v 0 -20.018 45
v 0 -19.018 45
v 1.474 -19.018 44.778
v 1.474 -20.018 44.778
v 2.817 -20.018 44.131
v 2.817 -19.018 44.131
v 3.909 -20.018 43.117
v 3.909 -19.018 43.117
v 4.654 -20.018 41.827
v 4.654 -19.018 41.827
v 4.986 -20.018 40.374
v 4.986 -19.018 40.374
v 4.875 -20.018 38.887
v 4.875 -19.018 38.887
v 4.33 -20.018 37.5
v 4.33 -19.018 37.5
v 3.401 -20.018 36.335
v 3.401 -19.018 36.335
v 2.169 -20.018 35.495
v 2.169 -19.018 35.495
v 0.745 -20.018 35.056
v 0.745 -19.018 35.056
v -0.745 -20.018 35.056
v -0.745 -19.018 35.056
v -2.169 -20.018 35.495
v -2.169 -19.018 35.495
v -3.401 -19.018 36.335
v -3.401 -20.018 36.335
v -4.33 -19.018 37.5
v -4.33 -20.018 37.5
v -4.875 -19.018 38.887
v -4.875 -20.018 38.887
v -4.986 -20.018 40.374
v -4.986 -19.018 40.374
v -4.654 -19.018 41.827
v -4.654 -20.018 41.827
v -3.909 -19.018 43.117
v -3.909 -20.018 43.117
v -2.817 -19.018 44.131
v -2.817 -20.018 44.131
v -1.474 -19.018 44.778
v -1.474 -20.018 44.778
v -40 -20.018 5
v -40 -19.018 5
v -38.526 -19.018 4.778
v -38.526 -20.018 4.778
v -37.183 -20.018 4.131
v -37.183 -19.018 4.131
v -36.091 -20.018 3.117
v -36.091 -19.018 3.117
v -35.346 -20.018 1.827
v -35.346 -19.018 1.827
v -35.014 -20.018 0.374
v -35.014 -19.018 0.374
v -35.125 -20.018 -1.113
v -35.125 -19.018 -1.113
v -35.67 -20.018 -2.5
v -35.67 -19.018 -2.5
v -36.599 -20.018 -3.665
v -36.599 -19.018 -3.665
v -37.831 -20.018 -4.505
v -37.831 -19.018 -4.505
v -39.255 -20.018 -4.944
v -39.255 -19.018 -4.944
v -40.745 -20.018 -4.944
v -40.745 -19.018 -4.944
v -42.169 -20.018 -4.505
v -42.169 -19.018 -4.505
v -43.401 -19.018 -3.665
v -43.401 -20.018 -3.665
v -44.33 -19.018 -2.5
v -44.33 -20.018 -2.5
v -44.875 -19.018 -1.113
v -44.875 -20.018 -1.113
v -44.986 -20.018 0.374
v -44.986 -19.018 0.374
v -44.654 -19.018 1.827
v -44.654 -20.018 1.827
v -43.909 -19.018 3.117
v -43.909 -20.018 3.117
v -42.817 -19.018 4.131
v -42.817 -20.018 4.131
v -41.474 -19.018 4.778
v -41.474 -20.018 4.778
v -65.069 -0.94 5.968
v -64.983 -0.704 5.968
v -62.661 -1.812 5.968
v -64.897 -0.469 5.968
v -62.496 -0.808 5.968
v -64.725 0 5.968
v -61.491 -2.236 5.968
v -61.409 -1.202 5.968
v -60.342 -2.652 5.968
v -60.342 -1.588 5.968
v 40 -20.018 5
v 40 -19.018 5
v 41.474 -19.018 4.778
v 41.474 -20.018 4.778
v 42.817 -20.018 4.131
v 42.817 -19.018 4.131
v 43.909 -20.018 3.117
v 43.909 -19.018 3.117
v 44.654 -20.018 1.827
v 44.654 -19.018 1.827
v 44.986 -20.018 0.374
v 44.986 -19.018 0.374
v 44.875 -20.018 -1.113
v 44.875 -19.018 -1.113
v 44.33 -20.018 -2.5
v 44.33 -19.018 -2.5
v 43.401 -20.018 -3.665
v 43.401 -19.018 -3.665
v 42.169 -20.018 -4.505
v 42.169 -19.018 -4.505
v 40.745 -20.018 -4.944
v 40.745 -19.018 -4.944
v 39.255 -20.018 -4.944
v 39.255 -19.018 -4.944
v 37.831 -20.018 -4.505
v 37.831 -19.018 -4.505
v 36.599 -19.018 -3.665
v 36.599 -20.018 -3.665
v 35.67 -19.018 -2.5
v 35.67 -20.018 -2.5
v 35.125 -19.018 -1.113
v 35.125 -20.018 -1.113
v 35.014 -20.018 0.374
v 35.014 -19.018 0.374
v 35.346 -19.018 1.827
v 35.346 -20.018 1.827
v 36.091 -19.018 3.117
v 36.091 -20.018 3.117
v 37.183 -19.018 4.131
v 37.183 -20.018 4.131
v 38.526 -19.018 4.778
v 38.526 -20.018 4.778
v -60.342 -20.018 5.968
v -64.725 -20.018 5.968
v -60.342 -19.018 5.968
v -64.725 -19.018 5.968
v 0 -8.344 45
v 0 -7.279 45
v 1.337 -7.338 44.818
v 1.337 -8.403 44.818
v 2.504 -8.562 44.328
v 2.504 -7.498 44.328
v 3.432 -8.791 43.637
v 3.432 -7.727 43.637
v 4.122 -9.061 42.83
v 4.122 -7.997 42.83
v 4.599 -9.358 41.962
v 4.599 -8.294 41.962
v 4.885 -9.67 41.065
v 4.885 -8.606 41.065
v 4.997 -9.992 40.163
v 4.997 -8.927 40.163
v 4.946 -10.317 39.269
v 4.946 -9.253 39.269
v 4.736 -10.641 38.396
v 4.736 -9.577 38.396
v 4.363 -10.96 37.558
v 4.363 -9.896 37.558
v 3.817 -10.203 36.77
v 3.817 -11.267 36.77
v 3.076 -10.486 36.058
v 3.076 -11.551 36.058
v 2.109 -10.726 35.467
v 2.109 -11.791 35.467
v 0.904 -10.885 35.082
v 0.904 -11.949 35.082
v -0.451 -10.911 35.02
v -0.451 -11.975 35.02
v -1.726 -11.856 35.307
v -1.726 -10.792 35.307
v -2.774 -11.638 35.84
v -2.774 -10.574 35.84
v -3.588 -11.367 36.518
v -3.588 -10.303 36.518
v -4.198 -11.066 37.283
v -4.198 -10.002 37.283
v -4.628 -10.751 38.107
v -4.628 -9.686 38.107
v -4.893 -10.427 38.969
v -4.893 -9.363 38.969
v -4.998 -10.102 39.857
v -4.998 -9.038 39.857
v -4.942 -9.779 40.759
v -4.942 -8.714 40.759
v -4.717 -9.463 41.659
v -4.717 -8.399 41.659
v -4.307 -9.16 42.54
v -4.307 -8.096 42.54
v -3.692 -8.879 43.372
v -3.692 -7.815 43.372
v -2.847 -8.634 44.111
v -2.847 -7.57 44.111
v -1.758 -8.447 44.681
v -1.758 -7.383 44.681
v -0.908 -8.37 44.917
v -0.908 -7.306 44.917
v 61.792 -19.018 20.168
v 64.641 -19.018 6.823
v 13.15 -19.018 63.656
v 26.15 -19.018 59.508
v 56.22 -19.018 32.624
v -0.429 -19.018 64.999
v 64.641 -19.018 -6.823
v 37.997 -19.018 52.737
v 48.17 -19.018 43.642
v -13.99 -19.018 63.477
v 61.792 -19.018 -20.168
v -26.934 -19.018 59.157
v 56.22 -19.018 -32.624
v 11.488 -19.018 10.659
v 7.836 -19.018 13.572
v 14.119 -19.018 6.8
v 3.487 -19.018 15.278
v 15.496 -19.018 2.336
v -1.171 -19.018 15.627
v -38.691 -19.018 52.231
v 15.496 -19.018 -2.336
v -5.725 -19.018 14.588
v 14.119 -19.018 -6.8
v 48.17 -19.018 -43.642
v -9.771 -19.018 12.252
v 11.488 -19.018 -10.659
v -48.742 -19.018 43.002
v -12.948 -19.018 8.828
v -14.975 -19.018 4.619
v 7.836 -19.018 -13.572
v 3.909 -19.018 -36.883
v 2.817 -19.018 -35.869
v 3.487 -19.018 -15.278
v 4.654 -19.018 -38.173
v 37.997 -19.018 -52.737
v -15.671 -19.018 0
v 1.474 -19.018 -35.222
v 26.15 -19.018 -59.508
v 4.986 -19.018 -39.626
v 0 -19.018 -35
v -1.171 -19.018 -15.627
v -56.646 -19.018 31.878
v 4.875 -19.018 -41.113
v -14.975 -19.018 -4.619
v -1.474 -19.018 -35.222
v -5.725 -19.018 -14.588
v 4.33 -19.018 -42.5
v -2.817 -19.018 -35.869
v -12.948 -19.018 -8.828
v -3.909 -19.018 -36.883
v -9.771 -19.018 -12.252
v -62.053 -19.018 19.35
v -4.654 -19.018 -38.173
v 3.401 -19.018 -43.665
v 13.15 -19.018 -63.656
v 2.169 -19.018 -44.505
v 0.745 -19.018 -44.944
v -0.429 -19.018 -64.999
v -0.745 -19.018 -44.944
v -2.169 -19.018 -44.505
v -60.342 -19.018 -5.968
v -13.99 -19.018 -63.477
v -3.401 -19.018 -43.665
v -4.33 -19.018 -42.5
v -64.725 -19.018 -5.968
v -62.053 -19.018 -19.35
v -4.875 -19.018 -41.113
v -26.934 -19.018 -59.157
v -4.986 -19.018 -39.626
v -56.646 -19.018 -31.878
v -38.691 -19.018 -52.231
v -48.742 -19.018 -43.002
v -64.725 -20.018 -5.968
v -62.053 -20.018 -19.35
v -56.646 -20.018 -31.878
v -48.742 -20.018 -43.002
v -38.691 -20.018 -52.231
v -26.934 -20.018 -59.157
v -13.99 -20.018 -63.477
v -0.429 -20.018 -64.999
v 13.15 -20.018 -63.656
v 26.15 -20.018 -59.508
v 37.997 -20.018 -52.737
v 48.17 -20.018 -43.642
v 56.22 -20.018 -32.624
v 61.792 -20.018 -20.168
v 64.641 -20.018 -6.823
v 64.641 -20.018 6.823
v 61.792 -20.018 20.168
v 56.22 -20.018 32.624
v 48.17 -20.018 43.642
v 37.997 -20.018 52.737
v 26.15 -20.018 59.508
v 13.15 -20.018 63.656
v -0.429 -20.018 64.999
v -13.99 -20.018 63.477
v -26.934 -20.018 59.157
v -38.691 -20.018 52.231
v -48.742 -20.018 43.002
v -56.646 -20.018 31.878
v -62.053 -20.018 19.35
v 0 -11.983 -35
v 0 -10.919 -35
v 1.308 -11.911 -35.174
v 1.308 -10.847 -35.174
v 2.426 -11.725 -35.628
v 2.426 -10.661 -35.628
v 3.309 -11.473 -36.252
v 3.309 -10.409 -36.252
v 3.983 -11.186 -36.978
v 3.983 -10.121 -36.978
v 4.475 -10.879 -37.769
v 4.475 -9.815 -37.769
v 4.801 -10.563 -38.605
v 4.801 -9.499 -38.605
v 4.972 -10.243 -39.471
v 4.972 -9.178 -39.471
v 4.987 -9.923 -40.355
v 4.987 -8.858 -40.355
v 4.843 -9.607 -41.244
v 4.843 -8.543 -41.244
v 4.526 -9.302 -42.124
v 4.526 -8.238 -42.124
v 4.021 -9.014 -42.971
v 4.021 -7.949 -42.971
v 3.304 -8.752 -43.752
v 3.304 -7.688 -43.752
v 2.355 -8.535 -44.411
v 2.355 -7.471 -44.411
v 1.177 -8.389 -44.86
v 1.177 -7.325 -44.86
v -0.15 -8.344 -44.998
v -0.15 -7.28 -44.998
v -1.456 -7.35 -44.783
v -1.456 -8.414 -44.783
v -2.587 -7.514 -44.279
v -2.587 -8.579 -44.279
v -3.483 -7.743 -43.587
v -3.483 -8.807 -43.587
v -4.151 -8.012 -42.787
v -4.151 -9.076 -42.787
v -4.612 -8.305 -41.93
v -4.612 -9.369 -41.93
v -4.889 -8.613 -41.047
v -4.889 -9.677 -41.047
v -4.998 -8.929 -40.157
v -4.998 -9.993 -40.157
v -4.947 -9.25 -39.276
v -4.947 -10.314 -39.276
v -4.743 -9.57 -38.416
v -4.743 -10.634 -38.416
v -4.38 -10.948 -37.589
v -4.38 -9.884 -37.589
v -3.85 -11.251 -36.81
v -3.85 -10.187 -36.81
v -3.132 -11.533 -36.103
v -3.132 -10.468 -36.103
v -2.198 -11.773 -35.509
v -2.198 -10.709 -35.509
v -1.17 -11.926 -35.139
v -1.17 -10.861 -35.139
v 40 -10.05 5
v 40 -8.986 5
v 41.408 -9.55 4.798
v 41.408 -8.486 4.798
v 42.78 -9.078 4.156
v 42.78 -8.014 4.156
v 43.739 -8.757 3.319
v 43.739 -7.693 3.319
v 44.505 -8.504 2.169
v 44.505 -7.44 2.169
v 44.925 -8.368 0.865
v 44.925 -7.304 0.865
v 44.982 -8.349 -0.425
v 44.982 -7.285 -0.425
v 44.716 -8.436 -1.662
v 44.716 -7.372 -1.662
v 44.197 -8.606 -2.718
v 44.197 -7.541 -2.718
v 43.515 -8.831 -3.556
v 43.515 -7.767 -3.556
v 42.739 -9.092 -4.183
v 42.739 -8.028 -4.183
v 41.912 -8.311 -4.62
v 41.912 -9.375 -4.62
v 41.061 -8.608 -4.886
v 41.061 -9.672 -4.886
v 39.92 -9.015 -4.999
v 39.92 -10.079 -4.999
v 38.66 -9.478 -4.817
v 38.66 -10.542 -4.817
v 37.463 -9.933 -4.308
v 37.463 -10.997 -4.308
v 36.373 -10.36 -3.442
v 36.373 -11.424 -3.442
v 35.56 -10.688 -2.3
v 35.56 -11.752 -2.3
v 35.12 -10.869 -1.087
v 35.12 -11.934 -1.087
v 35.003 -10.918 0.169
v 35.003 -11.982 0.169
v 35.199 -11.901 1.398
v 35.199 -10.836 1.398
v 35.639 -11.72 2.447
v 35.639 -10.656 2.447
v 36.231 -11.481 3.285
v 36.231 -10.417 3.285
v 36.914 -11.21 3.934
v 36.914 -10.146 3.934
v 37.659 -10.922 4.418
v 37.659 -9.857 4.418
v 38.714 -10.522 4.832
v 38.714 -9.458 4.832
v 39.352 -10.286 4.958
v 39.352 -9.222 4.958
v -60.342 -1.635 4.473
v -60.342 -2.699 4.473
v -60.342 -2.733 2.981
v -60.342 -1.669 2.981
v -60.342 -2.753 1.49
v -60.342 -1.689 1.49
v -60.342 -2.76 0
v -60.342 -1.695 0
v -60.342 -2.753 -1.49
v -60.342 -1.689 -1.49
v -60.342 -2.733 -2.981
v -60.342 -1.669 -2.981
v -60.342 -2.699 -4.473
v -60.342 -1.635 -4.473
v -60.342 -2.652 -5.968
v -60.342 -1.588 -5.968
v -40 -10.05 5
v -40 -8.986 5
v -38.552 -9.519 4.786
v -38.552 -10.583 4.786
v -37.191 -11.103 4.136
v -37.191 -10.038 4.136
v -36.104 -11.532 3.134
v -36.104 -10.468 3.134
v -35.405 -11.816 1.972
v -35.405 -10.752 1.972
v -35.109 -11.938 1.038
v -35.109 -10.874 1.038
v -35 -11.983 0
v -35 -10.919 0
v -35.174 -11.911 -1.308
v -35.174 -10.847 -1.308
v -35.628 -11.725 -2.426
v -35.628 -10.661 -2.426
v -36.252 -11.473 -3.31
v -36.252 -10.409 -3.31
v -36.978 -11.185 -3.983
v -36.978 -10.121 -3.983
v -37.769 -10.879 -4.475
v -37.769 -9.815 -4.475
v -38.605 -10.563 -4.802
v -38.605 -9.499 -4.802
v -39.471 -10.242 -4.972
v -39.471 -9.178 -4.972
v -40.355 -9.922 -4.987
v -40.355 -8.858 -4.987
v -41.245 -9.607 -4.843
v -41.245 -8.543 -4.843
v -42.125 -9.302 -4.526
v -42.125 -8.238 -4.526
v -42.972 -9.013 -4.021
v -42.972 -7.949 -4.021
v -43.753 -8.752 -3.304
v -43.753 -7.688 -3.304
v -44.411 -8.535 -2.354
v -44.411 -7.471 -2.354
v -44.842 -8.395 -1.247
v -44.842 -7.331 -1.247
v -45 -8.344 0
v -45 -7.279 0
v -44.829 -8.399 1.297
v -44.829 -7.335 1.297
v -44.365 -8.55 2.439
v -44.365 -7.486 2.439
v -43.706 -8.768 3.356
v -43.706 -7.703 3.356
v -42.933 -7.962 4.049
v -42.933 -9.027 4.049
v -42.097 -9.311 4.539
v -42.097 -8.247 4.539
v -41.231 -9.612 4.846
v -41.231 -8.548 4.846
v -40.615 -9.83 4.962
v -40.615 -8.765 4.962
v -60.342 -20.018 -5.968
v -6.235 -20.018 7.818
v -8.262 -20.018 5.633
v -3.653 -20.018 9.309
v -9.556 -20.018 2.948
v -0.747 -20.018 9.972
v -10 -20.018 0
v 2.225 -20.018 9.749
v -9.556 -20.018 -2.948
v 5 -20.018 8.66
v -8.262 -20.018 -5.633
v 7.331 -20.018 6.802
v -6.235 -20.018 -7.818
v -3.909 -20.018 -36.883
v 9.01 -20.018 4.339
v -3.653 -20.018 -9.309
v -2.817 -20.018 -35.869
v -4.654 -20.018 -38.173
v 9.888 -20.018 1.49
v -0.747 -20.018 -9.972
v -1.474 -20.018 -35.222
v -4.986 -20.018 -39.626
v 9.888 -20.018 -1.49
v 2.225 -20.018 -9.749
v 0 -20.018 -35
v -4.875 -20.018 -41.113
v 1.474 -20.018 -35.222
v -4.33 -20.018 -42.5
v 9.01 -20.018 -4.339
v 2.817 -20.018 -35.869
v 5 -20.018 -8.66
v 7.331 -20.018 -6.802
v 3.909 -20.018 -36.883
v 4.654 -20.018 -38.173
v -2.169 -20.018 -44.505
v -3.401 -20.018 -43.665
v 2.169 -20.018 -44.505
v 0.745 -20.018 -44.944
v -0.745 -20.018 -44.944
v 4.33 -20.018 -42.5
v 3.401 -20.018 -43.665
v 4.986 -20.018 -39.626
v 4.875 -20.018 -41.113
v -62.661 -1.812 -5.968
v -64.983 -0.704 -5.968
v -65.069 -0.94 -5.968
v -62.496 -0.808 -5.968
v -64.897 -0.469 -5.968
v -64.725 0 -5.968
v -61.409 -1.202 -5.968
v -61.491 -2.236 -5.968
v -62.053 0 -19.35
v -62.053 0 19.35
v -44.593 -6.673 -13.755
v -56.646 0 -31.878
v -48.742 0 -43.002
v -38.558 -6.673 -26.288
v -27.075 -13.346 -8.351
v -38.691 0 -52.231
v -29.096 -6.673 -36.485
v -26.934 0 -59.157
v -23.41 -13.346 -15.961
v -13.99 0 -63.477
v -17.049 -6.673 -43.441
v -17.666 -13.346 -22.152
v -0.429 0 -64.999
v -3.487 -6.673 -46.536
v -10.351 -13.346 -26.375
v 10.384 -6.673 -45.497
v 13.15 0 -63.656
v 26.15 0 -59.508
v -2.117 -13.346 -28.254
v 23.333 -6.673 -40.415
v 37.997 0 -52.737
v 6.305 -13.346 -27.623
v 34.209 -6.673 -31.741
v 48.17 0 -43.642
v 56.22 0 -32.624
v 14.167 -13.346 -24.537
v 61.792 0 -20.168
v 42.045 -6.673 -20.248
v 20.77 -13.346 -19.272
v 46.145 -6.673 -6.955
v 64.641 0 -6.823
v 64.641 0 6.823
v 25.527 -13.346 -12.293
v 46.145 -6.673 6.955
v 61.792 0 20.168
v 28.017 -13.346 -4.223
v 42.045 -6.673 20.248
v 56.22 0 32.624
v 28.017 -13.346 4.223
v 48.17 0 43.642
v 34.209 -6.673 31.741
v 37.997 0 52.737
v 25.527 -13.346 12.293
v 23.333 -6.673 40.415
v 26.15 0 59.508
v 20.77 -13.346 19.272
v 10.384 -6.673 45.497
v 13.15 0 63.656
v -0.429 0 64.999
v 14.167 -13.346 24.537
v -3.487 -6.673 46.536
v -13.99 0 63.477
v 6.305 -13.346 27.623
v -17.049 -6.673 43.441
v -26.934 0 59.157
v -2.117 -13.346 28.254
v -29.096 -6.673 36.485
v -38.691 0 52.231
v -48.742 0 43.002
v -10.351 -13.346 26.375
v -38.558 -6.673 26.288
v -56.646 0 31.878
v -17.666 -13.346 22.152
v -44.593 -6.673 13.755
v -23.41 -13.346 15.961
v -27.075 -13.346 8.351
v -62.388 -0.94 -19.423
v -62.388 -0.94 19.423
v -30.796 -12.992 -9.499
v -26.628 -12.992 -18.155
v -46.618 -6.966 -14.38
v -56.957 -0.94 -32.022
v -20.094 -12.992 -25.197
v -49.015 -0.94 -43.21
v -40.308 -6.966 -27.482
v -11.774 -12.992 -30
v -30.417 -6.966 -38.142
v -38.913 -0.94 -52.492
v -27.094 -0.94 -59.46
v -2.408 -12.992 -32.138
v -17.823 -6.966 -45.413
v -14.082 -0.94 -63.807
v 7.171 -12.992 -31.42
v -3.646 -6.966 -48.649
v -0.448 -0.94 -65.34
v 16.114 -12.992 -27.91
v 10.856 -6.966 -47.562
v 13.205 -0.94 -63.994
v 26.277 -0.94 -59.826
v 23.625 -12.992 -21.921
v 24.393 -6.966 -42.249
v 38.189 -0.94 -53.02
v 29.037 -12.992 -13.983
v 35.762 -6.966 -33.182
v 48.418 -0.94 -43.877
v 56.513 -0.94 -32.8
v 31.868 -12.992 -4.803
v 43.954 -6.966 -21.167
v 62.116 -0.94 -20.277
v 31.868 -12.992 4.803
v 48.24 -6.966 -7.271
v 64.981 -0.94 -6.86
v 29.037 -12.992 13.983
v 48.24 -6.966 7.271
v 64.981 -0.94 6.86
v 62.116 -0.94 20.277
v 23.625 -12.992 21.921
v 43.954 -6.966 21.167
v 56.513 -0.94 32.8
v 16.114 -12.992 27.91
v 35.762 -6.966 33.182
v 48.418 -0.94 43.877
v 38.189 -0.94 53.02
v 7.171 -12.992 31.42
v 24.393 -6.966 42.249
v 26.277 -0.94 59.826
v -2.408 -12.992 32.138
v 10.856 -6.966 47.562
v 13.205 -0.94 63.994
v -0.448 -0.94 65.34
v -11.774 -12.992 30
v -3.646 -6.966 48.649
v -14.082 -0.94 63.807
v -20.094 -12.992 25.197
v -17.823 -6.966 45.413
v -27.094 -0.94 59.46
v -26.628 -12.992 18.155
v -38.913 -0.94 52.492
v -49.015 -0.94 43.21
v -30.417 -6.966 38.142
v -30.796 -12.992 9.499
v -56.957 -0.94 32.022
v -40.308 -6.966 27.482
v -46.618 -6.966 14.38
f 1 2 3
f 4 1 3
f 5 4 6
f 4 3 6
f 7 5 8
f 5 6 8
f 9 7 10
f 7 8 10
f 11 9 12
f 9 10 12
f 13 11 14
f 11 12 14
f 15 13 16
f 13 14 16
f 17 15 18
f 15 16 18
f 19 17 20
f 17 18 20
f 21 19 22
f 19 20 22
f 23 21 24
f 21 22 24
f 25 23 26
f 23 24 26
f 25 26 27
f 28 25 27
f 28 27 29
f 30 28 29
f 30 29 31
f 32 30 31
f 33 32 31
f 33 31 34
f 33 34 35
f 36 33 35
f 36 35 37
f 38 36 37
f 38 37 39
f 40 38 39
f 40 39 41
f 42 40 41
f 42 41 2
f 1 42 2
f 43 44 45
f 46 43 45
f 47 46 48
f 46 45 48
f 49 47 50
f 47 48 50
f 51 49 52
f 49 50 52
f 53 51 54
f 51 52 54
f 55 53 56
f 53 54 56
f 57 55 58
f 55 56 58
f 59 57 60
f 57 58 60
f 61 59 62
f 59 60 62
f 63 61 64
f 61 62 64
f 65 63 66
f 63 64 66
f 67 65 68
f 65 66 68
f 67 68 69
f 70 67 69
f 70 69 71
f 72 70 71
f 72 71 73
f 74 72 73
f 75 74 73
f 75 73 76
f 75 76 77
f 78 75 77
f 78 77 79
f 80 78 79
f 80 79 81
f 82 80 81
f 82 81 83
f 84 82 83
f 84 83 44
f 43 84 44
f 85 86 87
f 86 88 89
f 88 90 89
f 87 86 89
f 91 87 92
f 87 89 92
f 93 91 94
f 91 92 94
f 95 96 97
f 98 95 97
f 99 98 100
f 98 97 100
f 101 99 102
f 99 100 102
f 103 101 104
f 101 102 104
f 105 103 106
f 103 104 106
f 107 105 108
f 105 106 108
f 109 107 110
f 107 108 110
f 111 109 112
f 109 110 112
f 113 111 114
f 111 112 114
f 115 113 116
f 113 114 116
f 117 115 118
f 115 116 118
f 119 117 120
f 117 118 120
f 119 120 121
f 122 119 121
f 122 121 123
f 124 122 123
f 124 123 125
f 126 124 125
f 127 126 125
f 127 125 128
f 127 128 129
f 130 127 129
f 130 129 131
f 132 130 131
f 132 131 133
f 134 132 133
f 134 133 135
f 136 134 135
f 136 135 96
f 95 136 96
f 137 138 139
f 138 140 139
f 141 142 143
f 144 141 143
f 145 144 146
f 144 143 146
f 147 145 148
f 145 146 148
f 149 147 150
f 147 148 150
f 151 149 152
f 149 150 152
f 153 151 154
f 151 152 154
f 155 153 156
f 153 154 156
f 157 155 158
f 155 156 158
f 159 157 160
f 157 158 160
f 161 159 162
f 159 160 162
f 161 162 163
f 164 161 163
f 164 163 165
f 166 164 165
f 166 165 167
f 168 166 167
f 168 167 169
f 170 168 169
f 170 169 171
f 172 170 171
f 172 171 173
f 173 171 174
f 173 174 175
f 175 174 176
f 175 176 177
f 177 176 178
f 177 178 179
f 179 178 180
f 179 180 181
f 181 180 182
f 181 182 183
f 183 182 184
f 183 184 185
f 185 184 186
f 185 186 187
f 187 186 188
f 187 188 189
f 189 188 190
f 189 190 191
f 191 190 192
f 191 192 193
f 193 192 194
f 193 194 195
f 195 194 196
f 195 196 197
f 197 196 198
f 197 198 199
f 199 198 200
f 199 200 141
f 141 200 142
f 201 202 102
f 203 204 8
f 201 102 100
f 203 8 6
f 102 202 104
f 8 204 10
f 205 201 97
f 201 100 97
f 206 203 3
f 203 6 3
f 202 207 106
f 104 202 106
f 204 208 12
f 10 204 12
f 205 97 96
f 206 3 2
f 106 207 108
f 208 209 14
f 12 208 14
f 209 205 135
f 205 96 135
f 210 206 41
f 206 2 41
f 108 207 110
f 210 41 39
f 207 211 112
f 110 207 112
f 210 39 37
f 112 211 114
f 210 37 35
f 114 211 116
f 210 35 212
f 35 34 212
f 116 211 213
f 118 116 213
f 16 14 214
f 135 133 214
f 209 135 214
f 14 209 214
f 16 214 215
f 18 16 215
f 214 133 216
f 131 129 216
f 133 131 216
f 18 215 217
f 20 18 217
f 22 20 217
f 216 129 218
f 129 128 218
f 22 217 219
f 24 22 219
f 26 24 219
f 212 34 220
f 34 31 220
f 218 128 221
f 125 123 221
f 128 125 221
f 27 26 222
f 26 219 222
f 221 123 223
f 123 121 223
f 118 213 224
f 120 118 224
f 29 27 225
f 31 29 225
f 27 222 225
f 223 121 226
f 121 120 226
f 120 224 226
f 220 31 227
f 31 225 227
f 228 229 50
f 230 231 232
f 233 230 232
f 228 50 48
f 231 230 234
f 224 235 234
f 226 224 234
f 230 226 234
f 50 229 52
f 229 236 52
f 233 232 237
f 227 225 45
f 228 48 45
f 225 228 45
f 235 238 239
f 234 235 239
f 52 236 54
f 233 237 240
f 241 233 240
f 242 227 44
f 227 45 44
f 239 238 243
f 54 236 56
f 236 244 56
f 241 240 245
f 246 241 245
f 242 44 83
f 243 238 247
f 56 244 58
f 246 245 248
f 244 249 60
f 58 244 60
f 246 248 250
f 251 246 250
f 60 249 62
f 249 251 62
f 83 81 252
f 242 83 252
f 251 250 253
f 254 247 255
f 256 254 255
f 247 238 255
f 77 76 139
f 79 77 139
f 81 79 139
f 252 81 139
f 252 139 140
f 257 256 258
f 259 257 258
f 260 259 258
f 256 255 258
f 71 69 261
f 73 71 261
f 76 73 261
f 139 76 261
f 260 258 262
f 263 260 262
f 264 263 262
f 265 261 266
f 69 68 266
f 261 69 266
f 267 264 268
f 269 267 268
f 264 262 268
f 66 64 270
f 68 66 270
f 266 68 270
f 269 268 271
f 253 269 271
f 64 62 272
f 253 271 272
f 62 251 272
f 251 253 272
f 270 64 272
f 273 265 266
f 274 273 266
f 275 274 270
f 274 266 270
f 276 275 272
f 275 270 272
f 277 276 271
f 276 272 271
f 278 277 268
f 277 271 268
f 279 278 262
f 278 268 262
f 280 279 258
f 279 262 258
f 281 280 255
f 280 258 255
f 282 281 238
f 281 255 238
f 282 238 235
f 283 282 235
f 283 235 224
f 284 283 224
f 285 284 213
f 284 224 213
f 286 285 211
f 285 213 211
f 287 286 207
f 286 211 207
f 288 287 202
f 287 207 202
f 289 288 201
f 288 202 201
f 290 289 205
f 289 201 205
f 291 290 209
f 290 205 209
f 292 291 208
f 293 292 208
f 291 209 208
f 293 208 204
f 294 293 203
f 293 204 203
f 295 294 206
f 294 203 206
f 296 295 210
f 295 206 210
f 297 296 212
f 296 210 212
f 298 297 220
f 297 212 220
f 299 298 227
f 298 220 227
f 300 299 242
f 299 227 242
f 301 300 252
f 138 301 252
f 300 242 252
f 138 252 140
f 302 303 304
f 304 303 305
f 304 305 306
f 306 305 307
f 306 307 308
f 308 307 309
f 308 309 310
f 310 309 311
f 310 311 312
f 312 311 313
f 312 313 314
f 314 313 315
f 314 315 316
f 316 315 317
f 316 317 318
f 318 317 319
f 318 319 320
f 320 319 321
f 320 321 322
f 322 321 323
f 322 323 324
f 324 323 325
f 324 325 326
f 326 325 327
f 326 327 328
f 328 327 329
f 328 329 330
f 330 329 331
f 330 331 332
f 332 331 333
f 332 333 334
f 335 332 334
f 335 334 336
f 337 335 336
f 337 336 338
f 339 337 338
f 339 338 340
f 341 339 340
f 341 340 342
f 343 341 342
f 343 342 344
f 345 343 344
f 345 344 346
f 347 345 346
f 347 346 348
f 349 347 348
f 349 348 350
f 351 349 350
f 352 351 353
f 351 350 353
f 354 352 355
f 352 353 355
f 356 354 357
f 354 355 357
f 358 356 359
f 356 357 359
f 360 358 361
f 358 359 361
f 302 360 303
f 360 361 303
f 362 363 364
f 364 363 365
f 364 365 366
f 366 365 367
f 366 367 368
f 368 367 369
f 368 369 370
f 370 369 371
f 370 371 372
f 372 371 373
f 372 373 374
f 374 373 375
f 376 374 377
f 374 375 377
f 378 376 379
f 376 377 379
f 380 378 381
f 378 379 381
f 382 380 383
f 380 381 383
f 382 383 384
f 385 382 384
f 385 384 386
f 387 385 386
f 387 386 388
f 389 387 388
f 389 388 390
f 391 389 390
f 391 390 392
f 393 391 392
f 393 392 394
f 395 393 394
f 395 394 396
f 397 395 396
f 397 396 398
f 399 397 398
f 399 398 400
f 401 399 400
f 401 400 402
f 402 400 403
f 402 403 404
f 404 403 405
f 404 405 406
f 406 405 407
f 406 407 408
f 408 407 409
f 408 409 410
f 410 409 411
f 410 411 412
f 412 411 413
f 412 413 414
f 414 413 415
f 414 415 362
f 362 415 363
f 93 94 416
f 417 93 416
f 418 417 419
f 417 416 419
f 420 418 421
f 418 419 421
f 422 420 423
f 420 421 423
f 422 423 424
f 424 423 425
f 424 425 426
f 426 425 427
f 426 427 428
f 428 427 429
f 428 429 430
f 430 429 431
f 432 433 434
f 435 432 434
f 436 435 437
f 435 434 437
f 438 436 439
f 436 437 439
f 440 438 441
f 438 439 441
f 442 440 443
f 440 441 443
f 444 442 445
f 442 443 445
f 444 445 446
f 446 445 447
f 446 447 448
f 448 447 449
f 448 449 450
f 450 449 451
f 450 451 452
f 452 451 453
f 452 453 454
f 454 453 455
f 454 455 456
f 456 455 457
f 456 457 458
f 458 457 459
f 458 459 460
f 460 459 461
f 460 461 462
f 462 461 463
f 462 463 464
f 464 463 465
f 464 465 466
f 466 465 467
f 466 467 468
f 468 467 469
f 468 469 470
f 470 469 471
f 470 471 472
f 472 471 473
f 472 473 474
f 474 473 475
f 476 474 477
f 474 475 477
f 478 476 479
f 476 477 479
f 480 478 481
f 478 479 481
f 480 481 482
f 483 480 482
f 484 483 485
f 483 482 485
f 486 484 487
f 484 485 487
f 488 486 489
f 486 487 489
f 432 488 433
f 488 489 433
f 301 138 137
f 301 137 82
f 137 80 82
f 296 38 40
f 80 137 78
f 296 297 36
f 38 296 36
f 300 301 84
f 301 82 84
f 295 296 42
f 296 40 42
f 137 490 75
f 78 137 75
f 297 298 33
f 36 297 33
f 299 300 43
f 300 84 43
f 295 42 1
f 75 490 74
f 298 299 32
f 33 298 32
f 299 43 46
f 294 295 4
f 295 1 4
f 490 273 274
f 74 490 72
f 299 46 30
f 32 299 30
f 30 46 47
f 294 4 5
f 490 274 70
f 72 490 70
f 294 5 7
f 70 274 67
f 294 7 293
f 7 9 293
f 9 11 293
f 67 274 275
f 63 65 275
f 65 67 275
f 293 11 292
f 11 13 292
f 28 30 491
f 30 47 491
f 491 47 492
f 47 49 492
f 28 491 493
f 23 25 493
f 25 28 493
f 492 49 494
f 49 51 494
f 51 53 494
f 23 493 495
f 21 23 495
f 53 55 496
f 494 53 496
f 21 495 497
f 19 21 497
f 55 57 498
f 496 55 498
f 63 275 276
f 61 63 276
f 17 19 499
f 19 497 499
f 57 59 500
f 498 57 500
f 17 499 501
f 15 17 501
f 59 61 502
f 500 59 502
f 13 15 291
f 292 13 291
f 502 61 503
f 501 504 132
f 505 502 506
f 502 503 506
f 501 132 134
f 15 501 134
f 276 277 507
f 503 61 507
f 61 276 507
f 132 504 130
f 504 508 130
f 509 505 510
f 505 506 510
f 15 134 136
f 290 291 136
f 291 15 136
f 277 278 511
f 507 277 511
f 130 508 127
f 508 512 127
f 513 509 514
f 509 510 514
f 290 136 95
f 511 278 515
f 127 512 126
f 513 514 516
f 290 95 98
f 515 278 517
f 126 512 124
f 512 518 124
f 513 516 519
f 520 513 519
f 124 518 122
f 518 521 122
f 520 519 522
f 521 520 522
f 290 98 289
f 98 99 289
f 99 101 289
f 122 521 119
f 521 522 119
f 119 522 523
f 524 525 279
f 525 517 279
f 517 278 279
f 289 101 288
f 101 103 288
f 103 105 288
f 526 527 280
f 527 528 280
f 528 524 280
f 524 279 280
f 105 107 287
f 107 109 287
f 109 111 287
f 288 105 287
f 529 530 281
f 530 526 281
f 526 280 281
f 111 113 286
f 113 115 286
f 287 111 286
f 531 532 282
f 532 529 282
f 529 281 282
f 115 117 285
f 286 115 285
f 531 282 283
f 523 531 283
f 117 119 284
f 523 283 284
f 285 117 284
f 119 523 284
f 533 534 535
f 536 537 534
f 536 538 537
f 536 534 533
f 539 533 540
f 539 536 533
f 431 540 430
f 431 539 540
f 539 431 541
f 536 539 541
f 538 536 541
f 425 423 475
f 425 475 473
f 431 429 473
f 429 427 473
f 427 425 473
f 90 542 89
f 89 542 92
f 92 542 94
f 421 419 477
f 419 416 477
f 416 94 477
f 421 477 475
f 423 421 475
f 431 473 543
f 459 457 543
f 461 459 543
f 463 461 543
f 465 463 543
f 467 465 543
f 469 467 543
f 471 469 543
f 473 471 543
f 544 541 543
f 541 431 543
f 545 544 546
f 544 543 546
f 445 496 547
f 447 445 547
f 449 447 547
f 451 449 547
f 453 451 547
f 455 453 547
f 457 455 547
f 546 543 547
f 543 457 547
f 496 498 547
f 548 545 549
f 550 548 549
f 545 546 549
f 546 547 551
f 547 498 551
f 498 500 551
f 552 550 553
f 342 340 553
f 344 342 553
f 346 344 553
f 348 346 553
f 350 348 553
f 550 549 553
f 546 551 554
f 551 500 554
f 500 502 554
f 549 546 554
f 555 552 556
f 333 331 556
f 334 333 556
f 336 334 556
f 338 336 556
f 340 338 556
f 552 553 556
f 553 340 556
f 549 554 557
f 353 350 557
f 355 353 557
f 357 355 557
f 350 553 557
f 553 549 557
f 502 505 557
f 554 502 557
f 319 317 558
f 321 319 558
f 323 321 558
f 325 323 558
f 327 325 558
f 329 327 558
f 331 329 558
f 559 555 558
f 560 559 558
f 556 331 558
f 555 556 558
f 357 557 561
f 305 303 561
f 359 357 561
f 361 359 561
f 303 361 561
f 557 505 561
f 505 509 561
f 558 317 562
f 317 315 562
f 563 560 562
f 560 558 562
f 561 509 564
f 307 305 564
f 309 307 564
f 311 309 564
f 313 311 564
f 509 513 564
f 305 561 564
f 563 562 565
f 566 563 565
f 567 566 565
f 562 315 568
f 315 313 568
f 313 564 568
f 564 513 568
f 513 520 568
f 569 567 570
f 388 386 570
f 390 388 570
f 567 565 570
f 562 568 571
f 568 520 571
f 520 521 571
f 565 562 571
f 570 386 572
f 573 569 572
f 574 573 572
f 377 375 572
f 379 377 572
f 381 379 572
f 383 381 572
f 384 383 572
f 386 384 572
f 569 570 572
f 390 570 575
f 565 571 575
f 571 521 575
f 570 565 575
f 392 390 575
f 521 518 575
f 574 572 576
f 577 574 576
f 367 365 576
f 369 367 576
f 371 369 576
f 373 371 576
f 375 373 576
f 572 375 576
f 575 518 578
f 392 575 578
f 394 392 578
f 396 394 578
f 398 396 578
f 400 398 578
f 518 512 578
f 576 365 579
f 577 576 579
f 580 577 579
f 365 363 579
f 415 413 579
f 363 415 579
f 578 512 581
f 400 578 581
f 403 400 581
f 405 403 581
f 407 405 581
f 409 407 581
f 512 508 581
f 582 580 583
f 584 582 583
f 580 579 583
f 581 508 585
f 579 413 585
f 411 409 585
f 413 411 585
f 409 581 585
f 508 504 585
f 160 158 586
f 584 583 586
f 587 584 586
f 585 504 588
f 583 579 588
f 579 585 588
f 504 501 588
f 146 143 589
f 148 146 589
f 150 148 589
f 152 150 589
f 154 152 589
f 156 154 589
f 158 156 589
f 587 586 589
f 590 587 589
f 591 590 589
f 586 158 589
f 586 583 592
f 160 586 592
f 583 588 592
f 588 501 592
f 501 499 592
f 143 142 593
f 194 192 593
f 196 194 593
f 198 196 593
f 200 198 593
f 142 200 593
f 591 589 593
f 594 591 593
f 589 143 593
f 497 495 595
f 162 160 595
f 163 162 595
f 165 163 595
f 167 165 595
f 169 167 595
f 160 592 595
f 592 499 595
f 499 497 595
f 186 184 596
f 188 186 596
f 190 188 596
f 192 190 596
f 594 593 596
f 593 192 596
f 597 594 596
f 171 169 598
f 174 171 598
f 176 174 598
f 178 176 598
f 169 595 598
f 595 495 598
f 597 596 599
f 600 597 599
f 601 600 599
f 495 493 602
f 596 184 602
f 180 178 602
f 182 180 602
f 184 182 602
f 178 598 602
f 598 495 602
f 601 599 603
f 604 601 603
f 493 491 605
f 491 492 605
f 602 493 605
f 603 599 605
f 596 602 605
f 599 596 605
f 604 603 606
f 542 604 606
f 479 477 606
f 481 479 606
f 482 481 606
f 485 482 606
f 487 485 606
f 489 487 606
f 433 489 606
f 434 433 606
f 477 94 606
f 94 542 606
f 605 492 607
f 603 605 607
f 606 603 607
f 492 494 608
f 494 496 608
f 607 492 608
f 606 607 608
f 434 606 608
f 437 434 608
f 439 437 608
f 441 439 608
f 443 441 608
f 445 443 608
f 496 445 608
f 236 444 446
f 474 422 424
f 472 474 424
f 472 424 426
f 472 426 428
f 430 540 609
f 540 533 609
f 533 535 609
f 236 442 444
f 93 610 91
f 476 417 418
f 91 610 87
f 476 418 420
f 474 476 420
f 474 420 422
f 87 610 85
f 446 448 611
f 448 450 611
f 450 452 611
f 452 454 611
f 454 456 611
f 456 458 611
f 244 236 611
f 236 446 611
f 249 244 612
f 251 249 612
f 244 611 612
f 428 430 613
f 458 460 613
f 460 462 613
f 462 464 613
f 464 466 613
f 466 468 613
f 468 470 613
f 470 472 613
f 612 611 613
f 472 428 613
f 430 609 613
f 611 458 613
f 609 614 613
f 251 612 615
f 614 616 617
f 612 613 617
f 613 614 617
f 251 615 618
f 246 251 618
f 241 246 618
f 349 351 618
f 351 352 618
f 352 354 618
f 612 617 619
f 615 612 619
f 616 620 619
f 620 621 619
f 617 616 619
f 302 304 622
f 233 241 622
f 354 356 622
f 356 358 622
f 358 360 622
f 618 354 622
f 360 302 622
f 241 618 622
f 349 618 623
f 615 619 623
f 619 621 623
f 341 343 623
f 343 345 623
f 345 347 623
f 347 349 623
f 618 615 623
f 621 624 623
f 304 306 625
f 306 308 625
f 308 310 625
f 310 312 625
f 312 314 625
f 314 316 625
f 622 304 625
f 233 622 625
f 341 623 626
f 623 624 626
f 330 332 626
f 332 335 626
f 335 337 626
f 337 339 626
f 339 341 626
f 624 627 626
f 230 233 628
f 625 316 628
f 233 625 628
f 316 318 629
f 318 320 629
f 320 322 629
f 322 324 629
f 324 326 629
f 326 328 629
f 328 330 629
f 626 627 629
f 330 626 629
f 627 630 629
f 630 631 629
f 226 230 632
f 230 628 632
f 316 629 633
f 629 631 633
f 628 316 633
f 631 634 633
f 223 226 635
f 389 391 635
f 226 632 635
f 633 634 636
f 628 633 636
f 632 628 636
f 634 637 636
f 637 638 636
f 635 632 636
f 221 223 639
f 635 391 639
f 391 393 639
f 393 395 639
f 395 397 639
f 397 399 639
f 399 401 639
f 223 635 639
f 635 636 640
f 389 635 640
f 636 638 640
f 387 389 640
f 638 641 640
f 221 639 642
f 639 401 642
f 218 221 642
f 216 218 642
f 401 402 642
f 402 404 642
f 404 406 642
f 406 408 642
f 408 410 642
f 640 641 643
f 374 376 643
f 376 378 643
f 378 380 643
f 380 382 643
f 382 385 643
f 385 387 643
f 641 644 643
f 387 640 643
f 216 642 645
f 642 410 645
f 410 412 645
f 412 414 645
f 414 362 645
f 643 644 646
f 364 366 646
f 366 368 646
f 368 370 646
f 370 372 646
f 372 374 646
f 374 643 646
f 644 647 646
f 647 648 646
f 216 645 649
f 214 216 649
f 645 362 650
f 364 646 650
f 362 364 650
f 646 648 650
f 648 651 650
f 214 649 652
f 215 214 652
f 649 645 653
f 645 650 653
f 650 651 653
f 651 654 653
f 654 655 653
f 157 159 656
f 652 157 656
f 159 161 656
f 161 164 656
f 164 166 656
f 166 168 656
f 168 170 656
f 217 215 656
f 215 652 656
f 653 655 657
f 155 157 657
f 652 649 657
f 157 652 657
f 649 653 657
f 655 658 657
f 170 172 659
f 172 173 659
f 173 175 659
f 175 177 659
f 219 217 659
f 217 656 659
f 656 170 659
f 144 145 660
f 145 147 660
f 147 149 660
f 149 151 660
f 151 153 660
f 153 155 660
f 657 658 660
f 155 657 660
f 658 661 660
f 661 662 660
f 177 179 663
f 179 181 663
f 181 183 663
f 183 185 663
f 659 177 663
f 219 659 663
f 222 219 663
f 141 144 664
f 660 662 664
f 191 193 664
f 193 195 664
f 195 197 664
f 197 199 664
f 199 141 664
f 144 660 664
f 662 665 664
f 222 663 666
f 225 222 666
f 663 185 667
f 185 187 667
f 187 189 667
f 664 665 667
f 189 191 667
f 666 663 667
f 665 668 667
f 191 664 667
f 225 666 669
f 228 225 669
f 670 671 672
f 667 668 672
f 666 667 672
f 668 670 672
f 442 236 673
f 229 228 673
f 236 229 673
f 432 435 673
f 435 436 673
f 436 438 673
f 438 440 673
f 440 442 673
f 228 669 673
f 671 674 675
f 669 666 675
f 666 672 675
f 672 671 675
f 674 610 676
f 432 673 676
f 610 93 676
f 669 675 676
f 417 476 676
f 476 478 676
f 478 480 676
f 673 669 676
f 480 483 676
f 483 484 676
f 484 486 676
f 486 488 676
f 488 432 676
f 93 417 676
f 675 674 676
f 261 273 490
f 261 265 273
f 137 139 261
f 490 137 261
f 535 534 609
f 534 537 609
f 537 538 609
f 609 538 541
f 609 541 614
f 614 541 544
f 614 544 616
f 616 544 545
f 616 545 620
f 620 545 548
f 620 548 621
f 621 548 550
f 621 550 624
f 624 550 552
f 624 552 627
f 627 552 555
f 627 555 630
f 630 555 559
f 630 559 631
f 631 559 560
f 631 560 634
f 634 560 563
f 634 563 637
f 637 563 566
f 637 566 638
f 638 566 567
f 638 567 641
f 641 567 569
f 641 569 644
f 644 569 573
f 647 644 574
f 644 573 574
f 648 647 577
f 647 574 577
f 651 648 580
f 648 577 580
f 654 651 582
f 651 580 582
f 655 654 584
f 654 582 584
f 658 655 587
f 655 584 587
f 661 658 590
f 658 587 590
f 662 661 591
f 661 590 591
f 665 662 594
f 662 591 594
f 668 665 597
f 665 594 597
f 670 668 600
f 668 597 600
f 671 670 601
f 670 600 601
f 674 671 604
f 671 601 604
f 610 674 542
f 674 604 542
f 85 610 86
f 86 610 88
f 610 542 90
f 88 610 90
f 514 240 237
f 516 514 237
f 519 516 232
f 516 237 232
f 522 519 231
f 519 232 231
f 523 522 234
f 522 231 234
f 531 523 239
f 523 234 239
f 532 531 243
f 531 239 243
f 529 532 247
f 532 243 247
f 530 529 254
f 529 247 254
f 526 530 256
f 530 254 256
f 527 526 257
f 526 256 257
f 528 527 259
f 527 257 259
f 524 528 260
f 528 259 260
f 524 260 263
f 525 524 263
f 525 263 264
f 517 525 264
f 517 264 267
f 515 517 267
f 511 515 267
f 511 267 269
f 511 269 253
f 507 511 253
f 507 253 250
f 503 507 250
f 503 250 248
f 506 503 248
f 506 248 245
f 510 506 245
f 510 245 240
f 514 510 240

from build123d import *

# Parameters (mm, degrees)
SKETCH2_R          = 5
SKETCH2_W          = 10
SKETCH2_H          = 11.93656
CUT_EXTRUDE1_DEPTH = 95.551012926


with BuildPart() as part:
    # Sketch1 → Revolve-Thin1 (revolve)
    with BuildSketch(Plane.XY):
        Polygon((-65, 0), (-10, -20.018362885), (-65, -20.018362885), (-65, -19.018362885), (-15.67128182, -19.018362885), (-65.342020143, -0.939692621), align=None)
    revolve(axis=Axis((0, 0, 0), (0, -1, 0)))

    # Sketch2 → Cut-Extrude1 (cut, through all)
    with BuildSketch(Plane(origin=(0, 0, 0), x_dir=(1, 0, 0), z_dir=(0, 1, 0))):
        with Locations(Location((-40, 0, 0), (0, 0, 270))):
            Circle(SKETCH2_R)
        with Locations(Location((0, 40, 0), (0, 0, 270))):
            Circle(SKETCH2_R)
        with Locations(Location((40, 0, 0), (0, 0, 270))):
            Circle(SKETCH2_R)
        with Locations(Location((0, -40, 0), (0, 0, 270))):
            Circle(SKETCH2_R)
        with Locations((-65.342020143, 0)):
            Rectangle(SKETCH2_W, SKETCH2_H)
    extrude(amount=-CUT_EXTRUDE1_DEPTH, mode=Mode.SUBTRACT)


solid = part.part
